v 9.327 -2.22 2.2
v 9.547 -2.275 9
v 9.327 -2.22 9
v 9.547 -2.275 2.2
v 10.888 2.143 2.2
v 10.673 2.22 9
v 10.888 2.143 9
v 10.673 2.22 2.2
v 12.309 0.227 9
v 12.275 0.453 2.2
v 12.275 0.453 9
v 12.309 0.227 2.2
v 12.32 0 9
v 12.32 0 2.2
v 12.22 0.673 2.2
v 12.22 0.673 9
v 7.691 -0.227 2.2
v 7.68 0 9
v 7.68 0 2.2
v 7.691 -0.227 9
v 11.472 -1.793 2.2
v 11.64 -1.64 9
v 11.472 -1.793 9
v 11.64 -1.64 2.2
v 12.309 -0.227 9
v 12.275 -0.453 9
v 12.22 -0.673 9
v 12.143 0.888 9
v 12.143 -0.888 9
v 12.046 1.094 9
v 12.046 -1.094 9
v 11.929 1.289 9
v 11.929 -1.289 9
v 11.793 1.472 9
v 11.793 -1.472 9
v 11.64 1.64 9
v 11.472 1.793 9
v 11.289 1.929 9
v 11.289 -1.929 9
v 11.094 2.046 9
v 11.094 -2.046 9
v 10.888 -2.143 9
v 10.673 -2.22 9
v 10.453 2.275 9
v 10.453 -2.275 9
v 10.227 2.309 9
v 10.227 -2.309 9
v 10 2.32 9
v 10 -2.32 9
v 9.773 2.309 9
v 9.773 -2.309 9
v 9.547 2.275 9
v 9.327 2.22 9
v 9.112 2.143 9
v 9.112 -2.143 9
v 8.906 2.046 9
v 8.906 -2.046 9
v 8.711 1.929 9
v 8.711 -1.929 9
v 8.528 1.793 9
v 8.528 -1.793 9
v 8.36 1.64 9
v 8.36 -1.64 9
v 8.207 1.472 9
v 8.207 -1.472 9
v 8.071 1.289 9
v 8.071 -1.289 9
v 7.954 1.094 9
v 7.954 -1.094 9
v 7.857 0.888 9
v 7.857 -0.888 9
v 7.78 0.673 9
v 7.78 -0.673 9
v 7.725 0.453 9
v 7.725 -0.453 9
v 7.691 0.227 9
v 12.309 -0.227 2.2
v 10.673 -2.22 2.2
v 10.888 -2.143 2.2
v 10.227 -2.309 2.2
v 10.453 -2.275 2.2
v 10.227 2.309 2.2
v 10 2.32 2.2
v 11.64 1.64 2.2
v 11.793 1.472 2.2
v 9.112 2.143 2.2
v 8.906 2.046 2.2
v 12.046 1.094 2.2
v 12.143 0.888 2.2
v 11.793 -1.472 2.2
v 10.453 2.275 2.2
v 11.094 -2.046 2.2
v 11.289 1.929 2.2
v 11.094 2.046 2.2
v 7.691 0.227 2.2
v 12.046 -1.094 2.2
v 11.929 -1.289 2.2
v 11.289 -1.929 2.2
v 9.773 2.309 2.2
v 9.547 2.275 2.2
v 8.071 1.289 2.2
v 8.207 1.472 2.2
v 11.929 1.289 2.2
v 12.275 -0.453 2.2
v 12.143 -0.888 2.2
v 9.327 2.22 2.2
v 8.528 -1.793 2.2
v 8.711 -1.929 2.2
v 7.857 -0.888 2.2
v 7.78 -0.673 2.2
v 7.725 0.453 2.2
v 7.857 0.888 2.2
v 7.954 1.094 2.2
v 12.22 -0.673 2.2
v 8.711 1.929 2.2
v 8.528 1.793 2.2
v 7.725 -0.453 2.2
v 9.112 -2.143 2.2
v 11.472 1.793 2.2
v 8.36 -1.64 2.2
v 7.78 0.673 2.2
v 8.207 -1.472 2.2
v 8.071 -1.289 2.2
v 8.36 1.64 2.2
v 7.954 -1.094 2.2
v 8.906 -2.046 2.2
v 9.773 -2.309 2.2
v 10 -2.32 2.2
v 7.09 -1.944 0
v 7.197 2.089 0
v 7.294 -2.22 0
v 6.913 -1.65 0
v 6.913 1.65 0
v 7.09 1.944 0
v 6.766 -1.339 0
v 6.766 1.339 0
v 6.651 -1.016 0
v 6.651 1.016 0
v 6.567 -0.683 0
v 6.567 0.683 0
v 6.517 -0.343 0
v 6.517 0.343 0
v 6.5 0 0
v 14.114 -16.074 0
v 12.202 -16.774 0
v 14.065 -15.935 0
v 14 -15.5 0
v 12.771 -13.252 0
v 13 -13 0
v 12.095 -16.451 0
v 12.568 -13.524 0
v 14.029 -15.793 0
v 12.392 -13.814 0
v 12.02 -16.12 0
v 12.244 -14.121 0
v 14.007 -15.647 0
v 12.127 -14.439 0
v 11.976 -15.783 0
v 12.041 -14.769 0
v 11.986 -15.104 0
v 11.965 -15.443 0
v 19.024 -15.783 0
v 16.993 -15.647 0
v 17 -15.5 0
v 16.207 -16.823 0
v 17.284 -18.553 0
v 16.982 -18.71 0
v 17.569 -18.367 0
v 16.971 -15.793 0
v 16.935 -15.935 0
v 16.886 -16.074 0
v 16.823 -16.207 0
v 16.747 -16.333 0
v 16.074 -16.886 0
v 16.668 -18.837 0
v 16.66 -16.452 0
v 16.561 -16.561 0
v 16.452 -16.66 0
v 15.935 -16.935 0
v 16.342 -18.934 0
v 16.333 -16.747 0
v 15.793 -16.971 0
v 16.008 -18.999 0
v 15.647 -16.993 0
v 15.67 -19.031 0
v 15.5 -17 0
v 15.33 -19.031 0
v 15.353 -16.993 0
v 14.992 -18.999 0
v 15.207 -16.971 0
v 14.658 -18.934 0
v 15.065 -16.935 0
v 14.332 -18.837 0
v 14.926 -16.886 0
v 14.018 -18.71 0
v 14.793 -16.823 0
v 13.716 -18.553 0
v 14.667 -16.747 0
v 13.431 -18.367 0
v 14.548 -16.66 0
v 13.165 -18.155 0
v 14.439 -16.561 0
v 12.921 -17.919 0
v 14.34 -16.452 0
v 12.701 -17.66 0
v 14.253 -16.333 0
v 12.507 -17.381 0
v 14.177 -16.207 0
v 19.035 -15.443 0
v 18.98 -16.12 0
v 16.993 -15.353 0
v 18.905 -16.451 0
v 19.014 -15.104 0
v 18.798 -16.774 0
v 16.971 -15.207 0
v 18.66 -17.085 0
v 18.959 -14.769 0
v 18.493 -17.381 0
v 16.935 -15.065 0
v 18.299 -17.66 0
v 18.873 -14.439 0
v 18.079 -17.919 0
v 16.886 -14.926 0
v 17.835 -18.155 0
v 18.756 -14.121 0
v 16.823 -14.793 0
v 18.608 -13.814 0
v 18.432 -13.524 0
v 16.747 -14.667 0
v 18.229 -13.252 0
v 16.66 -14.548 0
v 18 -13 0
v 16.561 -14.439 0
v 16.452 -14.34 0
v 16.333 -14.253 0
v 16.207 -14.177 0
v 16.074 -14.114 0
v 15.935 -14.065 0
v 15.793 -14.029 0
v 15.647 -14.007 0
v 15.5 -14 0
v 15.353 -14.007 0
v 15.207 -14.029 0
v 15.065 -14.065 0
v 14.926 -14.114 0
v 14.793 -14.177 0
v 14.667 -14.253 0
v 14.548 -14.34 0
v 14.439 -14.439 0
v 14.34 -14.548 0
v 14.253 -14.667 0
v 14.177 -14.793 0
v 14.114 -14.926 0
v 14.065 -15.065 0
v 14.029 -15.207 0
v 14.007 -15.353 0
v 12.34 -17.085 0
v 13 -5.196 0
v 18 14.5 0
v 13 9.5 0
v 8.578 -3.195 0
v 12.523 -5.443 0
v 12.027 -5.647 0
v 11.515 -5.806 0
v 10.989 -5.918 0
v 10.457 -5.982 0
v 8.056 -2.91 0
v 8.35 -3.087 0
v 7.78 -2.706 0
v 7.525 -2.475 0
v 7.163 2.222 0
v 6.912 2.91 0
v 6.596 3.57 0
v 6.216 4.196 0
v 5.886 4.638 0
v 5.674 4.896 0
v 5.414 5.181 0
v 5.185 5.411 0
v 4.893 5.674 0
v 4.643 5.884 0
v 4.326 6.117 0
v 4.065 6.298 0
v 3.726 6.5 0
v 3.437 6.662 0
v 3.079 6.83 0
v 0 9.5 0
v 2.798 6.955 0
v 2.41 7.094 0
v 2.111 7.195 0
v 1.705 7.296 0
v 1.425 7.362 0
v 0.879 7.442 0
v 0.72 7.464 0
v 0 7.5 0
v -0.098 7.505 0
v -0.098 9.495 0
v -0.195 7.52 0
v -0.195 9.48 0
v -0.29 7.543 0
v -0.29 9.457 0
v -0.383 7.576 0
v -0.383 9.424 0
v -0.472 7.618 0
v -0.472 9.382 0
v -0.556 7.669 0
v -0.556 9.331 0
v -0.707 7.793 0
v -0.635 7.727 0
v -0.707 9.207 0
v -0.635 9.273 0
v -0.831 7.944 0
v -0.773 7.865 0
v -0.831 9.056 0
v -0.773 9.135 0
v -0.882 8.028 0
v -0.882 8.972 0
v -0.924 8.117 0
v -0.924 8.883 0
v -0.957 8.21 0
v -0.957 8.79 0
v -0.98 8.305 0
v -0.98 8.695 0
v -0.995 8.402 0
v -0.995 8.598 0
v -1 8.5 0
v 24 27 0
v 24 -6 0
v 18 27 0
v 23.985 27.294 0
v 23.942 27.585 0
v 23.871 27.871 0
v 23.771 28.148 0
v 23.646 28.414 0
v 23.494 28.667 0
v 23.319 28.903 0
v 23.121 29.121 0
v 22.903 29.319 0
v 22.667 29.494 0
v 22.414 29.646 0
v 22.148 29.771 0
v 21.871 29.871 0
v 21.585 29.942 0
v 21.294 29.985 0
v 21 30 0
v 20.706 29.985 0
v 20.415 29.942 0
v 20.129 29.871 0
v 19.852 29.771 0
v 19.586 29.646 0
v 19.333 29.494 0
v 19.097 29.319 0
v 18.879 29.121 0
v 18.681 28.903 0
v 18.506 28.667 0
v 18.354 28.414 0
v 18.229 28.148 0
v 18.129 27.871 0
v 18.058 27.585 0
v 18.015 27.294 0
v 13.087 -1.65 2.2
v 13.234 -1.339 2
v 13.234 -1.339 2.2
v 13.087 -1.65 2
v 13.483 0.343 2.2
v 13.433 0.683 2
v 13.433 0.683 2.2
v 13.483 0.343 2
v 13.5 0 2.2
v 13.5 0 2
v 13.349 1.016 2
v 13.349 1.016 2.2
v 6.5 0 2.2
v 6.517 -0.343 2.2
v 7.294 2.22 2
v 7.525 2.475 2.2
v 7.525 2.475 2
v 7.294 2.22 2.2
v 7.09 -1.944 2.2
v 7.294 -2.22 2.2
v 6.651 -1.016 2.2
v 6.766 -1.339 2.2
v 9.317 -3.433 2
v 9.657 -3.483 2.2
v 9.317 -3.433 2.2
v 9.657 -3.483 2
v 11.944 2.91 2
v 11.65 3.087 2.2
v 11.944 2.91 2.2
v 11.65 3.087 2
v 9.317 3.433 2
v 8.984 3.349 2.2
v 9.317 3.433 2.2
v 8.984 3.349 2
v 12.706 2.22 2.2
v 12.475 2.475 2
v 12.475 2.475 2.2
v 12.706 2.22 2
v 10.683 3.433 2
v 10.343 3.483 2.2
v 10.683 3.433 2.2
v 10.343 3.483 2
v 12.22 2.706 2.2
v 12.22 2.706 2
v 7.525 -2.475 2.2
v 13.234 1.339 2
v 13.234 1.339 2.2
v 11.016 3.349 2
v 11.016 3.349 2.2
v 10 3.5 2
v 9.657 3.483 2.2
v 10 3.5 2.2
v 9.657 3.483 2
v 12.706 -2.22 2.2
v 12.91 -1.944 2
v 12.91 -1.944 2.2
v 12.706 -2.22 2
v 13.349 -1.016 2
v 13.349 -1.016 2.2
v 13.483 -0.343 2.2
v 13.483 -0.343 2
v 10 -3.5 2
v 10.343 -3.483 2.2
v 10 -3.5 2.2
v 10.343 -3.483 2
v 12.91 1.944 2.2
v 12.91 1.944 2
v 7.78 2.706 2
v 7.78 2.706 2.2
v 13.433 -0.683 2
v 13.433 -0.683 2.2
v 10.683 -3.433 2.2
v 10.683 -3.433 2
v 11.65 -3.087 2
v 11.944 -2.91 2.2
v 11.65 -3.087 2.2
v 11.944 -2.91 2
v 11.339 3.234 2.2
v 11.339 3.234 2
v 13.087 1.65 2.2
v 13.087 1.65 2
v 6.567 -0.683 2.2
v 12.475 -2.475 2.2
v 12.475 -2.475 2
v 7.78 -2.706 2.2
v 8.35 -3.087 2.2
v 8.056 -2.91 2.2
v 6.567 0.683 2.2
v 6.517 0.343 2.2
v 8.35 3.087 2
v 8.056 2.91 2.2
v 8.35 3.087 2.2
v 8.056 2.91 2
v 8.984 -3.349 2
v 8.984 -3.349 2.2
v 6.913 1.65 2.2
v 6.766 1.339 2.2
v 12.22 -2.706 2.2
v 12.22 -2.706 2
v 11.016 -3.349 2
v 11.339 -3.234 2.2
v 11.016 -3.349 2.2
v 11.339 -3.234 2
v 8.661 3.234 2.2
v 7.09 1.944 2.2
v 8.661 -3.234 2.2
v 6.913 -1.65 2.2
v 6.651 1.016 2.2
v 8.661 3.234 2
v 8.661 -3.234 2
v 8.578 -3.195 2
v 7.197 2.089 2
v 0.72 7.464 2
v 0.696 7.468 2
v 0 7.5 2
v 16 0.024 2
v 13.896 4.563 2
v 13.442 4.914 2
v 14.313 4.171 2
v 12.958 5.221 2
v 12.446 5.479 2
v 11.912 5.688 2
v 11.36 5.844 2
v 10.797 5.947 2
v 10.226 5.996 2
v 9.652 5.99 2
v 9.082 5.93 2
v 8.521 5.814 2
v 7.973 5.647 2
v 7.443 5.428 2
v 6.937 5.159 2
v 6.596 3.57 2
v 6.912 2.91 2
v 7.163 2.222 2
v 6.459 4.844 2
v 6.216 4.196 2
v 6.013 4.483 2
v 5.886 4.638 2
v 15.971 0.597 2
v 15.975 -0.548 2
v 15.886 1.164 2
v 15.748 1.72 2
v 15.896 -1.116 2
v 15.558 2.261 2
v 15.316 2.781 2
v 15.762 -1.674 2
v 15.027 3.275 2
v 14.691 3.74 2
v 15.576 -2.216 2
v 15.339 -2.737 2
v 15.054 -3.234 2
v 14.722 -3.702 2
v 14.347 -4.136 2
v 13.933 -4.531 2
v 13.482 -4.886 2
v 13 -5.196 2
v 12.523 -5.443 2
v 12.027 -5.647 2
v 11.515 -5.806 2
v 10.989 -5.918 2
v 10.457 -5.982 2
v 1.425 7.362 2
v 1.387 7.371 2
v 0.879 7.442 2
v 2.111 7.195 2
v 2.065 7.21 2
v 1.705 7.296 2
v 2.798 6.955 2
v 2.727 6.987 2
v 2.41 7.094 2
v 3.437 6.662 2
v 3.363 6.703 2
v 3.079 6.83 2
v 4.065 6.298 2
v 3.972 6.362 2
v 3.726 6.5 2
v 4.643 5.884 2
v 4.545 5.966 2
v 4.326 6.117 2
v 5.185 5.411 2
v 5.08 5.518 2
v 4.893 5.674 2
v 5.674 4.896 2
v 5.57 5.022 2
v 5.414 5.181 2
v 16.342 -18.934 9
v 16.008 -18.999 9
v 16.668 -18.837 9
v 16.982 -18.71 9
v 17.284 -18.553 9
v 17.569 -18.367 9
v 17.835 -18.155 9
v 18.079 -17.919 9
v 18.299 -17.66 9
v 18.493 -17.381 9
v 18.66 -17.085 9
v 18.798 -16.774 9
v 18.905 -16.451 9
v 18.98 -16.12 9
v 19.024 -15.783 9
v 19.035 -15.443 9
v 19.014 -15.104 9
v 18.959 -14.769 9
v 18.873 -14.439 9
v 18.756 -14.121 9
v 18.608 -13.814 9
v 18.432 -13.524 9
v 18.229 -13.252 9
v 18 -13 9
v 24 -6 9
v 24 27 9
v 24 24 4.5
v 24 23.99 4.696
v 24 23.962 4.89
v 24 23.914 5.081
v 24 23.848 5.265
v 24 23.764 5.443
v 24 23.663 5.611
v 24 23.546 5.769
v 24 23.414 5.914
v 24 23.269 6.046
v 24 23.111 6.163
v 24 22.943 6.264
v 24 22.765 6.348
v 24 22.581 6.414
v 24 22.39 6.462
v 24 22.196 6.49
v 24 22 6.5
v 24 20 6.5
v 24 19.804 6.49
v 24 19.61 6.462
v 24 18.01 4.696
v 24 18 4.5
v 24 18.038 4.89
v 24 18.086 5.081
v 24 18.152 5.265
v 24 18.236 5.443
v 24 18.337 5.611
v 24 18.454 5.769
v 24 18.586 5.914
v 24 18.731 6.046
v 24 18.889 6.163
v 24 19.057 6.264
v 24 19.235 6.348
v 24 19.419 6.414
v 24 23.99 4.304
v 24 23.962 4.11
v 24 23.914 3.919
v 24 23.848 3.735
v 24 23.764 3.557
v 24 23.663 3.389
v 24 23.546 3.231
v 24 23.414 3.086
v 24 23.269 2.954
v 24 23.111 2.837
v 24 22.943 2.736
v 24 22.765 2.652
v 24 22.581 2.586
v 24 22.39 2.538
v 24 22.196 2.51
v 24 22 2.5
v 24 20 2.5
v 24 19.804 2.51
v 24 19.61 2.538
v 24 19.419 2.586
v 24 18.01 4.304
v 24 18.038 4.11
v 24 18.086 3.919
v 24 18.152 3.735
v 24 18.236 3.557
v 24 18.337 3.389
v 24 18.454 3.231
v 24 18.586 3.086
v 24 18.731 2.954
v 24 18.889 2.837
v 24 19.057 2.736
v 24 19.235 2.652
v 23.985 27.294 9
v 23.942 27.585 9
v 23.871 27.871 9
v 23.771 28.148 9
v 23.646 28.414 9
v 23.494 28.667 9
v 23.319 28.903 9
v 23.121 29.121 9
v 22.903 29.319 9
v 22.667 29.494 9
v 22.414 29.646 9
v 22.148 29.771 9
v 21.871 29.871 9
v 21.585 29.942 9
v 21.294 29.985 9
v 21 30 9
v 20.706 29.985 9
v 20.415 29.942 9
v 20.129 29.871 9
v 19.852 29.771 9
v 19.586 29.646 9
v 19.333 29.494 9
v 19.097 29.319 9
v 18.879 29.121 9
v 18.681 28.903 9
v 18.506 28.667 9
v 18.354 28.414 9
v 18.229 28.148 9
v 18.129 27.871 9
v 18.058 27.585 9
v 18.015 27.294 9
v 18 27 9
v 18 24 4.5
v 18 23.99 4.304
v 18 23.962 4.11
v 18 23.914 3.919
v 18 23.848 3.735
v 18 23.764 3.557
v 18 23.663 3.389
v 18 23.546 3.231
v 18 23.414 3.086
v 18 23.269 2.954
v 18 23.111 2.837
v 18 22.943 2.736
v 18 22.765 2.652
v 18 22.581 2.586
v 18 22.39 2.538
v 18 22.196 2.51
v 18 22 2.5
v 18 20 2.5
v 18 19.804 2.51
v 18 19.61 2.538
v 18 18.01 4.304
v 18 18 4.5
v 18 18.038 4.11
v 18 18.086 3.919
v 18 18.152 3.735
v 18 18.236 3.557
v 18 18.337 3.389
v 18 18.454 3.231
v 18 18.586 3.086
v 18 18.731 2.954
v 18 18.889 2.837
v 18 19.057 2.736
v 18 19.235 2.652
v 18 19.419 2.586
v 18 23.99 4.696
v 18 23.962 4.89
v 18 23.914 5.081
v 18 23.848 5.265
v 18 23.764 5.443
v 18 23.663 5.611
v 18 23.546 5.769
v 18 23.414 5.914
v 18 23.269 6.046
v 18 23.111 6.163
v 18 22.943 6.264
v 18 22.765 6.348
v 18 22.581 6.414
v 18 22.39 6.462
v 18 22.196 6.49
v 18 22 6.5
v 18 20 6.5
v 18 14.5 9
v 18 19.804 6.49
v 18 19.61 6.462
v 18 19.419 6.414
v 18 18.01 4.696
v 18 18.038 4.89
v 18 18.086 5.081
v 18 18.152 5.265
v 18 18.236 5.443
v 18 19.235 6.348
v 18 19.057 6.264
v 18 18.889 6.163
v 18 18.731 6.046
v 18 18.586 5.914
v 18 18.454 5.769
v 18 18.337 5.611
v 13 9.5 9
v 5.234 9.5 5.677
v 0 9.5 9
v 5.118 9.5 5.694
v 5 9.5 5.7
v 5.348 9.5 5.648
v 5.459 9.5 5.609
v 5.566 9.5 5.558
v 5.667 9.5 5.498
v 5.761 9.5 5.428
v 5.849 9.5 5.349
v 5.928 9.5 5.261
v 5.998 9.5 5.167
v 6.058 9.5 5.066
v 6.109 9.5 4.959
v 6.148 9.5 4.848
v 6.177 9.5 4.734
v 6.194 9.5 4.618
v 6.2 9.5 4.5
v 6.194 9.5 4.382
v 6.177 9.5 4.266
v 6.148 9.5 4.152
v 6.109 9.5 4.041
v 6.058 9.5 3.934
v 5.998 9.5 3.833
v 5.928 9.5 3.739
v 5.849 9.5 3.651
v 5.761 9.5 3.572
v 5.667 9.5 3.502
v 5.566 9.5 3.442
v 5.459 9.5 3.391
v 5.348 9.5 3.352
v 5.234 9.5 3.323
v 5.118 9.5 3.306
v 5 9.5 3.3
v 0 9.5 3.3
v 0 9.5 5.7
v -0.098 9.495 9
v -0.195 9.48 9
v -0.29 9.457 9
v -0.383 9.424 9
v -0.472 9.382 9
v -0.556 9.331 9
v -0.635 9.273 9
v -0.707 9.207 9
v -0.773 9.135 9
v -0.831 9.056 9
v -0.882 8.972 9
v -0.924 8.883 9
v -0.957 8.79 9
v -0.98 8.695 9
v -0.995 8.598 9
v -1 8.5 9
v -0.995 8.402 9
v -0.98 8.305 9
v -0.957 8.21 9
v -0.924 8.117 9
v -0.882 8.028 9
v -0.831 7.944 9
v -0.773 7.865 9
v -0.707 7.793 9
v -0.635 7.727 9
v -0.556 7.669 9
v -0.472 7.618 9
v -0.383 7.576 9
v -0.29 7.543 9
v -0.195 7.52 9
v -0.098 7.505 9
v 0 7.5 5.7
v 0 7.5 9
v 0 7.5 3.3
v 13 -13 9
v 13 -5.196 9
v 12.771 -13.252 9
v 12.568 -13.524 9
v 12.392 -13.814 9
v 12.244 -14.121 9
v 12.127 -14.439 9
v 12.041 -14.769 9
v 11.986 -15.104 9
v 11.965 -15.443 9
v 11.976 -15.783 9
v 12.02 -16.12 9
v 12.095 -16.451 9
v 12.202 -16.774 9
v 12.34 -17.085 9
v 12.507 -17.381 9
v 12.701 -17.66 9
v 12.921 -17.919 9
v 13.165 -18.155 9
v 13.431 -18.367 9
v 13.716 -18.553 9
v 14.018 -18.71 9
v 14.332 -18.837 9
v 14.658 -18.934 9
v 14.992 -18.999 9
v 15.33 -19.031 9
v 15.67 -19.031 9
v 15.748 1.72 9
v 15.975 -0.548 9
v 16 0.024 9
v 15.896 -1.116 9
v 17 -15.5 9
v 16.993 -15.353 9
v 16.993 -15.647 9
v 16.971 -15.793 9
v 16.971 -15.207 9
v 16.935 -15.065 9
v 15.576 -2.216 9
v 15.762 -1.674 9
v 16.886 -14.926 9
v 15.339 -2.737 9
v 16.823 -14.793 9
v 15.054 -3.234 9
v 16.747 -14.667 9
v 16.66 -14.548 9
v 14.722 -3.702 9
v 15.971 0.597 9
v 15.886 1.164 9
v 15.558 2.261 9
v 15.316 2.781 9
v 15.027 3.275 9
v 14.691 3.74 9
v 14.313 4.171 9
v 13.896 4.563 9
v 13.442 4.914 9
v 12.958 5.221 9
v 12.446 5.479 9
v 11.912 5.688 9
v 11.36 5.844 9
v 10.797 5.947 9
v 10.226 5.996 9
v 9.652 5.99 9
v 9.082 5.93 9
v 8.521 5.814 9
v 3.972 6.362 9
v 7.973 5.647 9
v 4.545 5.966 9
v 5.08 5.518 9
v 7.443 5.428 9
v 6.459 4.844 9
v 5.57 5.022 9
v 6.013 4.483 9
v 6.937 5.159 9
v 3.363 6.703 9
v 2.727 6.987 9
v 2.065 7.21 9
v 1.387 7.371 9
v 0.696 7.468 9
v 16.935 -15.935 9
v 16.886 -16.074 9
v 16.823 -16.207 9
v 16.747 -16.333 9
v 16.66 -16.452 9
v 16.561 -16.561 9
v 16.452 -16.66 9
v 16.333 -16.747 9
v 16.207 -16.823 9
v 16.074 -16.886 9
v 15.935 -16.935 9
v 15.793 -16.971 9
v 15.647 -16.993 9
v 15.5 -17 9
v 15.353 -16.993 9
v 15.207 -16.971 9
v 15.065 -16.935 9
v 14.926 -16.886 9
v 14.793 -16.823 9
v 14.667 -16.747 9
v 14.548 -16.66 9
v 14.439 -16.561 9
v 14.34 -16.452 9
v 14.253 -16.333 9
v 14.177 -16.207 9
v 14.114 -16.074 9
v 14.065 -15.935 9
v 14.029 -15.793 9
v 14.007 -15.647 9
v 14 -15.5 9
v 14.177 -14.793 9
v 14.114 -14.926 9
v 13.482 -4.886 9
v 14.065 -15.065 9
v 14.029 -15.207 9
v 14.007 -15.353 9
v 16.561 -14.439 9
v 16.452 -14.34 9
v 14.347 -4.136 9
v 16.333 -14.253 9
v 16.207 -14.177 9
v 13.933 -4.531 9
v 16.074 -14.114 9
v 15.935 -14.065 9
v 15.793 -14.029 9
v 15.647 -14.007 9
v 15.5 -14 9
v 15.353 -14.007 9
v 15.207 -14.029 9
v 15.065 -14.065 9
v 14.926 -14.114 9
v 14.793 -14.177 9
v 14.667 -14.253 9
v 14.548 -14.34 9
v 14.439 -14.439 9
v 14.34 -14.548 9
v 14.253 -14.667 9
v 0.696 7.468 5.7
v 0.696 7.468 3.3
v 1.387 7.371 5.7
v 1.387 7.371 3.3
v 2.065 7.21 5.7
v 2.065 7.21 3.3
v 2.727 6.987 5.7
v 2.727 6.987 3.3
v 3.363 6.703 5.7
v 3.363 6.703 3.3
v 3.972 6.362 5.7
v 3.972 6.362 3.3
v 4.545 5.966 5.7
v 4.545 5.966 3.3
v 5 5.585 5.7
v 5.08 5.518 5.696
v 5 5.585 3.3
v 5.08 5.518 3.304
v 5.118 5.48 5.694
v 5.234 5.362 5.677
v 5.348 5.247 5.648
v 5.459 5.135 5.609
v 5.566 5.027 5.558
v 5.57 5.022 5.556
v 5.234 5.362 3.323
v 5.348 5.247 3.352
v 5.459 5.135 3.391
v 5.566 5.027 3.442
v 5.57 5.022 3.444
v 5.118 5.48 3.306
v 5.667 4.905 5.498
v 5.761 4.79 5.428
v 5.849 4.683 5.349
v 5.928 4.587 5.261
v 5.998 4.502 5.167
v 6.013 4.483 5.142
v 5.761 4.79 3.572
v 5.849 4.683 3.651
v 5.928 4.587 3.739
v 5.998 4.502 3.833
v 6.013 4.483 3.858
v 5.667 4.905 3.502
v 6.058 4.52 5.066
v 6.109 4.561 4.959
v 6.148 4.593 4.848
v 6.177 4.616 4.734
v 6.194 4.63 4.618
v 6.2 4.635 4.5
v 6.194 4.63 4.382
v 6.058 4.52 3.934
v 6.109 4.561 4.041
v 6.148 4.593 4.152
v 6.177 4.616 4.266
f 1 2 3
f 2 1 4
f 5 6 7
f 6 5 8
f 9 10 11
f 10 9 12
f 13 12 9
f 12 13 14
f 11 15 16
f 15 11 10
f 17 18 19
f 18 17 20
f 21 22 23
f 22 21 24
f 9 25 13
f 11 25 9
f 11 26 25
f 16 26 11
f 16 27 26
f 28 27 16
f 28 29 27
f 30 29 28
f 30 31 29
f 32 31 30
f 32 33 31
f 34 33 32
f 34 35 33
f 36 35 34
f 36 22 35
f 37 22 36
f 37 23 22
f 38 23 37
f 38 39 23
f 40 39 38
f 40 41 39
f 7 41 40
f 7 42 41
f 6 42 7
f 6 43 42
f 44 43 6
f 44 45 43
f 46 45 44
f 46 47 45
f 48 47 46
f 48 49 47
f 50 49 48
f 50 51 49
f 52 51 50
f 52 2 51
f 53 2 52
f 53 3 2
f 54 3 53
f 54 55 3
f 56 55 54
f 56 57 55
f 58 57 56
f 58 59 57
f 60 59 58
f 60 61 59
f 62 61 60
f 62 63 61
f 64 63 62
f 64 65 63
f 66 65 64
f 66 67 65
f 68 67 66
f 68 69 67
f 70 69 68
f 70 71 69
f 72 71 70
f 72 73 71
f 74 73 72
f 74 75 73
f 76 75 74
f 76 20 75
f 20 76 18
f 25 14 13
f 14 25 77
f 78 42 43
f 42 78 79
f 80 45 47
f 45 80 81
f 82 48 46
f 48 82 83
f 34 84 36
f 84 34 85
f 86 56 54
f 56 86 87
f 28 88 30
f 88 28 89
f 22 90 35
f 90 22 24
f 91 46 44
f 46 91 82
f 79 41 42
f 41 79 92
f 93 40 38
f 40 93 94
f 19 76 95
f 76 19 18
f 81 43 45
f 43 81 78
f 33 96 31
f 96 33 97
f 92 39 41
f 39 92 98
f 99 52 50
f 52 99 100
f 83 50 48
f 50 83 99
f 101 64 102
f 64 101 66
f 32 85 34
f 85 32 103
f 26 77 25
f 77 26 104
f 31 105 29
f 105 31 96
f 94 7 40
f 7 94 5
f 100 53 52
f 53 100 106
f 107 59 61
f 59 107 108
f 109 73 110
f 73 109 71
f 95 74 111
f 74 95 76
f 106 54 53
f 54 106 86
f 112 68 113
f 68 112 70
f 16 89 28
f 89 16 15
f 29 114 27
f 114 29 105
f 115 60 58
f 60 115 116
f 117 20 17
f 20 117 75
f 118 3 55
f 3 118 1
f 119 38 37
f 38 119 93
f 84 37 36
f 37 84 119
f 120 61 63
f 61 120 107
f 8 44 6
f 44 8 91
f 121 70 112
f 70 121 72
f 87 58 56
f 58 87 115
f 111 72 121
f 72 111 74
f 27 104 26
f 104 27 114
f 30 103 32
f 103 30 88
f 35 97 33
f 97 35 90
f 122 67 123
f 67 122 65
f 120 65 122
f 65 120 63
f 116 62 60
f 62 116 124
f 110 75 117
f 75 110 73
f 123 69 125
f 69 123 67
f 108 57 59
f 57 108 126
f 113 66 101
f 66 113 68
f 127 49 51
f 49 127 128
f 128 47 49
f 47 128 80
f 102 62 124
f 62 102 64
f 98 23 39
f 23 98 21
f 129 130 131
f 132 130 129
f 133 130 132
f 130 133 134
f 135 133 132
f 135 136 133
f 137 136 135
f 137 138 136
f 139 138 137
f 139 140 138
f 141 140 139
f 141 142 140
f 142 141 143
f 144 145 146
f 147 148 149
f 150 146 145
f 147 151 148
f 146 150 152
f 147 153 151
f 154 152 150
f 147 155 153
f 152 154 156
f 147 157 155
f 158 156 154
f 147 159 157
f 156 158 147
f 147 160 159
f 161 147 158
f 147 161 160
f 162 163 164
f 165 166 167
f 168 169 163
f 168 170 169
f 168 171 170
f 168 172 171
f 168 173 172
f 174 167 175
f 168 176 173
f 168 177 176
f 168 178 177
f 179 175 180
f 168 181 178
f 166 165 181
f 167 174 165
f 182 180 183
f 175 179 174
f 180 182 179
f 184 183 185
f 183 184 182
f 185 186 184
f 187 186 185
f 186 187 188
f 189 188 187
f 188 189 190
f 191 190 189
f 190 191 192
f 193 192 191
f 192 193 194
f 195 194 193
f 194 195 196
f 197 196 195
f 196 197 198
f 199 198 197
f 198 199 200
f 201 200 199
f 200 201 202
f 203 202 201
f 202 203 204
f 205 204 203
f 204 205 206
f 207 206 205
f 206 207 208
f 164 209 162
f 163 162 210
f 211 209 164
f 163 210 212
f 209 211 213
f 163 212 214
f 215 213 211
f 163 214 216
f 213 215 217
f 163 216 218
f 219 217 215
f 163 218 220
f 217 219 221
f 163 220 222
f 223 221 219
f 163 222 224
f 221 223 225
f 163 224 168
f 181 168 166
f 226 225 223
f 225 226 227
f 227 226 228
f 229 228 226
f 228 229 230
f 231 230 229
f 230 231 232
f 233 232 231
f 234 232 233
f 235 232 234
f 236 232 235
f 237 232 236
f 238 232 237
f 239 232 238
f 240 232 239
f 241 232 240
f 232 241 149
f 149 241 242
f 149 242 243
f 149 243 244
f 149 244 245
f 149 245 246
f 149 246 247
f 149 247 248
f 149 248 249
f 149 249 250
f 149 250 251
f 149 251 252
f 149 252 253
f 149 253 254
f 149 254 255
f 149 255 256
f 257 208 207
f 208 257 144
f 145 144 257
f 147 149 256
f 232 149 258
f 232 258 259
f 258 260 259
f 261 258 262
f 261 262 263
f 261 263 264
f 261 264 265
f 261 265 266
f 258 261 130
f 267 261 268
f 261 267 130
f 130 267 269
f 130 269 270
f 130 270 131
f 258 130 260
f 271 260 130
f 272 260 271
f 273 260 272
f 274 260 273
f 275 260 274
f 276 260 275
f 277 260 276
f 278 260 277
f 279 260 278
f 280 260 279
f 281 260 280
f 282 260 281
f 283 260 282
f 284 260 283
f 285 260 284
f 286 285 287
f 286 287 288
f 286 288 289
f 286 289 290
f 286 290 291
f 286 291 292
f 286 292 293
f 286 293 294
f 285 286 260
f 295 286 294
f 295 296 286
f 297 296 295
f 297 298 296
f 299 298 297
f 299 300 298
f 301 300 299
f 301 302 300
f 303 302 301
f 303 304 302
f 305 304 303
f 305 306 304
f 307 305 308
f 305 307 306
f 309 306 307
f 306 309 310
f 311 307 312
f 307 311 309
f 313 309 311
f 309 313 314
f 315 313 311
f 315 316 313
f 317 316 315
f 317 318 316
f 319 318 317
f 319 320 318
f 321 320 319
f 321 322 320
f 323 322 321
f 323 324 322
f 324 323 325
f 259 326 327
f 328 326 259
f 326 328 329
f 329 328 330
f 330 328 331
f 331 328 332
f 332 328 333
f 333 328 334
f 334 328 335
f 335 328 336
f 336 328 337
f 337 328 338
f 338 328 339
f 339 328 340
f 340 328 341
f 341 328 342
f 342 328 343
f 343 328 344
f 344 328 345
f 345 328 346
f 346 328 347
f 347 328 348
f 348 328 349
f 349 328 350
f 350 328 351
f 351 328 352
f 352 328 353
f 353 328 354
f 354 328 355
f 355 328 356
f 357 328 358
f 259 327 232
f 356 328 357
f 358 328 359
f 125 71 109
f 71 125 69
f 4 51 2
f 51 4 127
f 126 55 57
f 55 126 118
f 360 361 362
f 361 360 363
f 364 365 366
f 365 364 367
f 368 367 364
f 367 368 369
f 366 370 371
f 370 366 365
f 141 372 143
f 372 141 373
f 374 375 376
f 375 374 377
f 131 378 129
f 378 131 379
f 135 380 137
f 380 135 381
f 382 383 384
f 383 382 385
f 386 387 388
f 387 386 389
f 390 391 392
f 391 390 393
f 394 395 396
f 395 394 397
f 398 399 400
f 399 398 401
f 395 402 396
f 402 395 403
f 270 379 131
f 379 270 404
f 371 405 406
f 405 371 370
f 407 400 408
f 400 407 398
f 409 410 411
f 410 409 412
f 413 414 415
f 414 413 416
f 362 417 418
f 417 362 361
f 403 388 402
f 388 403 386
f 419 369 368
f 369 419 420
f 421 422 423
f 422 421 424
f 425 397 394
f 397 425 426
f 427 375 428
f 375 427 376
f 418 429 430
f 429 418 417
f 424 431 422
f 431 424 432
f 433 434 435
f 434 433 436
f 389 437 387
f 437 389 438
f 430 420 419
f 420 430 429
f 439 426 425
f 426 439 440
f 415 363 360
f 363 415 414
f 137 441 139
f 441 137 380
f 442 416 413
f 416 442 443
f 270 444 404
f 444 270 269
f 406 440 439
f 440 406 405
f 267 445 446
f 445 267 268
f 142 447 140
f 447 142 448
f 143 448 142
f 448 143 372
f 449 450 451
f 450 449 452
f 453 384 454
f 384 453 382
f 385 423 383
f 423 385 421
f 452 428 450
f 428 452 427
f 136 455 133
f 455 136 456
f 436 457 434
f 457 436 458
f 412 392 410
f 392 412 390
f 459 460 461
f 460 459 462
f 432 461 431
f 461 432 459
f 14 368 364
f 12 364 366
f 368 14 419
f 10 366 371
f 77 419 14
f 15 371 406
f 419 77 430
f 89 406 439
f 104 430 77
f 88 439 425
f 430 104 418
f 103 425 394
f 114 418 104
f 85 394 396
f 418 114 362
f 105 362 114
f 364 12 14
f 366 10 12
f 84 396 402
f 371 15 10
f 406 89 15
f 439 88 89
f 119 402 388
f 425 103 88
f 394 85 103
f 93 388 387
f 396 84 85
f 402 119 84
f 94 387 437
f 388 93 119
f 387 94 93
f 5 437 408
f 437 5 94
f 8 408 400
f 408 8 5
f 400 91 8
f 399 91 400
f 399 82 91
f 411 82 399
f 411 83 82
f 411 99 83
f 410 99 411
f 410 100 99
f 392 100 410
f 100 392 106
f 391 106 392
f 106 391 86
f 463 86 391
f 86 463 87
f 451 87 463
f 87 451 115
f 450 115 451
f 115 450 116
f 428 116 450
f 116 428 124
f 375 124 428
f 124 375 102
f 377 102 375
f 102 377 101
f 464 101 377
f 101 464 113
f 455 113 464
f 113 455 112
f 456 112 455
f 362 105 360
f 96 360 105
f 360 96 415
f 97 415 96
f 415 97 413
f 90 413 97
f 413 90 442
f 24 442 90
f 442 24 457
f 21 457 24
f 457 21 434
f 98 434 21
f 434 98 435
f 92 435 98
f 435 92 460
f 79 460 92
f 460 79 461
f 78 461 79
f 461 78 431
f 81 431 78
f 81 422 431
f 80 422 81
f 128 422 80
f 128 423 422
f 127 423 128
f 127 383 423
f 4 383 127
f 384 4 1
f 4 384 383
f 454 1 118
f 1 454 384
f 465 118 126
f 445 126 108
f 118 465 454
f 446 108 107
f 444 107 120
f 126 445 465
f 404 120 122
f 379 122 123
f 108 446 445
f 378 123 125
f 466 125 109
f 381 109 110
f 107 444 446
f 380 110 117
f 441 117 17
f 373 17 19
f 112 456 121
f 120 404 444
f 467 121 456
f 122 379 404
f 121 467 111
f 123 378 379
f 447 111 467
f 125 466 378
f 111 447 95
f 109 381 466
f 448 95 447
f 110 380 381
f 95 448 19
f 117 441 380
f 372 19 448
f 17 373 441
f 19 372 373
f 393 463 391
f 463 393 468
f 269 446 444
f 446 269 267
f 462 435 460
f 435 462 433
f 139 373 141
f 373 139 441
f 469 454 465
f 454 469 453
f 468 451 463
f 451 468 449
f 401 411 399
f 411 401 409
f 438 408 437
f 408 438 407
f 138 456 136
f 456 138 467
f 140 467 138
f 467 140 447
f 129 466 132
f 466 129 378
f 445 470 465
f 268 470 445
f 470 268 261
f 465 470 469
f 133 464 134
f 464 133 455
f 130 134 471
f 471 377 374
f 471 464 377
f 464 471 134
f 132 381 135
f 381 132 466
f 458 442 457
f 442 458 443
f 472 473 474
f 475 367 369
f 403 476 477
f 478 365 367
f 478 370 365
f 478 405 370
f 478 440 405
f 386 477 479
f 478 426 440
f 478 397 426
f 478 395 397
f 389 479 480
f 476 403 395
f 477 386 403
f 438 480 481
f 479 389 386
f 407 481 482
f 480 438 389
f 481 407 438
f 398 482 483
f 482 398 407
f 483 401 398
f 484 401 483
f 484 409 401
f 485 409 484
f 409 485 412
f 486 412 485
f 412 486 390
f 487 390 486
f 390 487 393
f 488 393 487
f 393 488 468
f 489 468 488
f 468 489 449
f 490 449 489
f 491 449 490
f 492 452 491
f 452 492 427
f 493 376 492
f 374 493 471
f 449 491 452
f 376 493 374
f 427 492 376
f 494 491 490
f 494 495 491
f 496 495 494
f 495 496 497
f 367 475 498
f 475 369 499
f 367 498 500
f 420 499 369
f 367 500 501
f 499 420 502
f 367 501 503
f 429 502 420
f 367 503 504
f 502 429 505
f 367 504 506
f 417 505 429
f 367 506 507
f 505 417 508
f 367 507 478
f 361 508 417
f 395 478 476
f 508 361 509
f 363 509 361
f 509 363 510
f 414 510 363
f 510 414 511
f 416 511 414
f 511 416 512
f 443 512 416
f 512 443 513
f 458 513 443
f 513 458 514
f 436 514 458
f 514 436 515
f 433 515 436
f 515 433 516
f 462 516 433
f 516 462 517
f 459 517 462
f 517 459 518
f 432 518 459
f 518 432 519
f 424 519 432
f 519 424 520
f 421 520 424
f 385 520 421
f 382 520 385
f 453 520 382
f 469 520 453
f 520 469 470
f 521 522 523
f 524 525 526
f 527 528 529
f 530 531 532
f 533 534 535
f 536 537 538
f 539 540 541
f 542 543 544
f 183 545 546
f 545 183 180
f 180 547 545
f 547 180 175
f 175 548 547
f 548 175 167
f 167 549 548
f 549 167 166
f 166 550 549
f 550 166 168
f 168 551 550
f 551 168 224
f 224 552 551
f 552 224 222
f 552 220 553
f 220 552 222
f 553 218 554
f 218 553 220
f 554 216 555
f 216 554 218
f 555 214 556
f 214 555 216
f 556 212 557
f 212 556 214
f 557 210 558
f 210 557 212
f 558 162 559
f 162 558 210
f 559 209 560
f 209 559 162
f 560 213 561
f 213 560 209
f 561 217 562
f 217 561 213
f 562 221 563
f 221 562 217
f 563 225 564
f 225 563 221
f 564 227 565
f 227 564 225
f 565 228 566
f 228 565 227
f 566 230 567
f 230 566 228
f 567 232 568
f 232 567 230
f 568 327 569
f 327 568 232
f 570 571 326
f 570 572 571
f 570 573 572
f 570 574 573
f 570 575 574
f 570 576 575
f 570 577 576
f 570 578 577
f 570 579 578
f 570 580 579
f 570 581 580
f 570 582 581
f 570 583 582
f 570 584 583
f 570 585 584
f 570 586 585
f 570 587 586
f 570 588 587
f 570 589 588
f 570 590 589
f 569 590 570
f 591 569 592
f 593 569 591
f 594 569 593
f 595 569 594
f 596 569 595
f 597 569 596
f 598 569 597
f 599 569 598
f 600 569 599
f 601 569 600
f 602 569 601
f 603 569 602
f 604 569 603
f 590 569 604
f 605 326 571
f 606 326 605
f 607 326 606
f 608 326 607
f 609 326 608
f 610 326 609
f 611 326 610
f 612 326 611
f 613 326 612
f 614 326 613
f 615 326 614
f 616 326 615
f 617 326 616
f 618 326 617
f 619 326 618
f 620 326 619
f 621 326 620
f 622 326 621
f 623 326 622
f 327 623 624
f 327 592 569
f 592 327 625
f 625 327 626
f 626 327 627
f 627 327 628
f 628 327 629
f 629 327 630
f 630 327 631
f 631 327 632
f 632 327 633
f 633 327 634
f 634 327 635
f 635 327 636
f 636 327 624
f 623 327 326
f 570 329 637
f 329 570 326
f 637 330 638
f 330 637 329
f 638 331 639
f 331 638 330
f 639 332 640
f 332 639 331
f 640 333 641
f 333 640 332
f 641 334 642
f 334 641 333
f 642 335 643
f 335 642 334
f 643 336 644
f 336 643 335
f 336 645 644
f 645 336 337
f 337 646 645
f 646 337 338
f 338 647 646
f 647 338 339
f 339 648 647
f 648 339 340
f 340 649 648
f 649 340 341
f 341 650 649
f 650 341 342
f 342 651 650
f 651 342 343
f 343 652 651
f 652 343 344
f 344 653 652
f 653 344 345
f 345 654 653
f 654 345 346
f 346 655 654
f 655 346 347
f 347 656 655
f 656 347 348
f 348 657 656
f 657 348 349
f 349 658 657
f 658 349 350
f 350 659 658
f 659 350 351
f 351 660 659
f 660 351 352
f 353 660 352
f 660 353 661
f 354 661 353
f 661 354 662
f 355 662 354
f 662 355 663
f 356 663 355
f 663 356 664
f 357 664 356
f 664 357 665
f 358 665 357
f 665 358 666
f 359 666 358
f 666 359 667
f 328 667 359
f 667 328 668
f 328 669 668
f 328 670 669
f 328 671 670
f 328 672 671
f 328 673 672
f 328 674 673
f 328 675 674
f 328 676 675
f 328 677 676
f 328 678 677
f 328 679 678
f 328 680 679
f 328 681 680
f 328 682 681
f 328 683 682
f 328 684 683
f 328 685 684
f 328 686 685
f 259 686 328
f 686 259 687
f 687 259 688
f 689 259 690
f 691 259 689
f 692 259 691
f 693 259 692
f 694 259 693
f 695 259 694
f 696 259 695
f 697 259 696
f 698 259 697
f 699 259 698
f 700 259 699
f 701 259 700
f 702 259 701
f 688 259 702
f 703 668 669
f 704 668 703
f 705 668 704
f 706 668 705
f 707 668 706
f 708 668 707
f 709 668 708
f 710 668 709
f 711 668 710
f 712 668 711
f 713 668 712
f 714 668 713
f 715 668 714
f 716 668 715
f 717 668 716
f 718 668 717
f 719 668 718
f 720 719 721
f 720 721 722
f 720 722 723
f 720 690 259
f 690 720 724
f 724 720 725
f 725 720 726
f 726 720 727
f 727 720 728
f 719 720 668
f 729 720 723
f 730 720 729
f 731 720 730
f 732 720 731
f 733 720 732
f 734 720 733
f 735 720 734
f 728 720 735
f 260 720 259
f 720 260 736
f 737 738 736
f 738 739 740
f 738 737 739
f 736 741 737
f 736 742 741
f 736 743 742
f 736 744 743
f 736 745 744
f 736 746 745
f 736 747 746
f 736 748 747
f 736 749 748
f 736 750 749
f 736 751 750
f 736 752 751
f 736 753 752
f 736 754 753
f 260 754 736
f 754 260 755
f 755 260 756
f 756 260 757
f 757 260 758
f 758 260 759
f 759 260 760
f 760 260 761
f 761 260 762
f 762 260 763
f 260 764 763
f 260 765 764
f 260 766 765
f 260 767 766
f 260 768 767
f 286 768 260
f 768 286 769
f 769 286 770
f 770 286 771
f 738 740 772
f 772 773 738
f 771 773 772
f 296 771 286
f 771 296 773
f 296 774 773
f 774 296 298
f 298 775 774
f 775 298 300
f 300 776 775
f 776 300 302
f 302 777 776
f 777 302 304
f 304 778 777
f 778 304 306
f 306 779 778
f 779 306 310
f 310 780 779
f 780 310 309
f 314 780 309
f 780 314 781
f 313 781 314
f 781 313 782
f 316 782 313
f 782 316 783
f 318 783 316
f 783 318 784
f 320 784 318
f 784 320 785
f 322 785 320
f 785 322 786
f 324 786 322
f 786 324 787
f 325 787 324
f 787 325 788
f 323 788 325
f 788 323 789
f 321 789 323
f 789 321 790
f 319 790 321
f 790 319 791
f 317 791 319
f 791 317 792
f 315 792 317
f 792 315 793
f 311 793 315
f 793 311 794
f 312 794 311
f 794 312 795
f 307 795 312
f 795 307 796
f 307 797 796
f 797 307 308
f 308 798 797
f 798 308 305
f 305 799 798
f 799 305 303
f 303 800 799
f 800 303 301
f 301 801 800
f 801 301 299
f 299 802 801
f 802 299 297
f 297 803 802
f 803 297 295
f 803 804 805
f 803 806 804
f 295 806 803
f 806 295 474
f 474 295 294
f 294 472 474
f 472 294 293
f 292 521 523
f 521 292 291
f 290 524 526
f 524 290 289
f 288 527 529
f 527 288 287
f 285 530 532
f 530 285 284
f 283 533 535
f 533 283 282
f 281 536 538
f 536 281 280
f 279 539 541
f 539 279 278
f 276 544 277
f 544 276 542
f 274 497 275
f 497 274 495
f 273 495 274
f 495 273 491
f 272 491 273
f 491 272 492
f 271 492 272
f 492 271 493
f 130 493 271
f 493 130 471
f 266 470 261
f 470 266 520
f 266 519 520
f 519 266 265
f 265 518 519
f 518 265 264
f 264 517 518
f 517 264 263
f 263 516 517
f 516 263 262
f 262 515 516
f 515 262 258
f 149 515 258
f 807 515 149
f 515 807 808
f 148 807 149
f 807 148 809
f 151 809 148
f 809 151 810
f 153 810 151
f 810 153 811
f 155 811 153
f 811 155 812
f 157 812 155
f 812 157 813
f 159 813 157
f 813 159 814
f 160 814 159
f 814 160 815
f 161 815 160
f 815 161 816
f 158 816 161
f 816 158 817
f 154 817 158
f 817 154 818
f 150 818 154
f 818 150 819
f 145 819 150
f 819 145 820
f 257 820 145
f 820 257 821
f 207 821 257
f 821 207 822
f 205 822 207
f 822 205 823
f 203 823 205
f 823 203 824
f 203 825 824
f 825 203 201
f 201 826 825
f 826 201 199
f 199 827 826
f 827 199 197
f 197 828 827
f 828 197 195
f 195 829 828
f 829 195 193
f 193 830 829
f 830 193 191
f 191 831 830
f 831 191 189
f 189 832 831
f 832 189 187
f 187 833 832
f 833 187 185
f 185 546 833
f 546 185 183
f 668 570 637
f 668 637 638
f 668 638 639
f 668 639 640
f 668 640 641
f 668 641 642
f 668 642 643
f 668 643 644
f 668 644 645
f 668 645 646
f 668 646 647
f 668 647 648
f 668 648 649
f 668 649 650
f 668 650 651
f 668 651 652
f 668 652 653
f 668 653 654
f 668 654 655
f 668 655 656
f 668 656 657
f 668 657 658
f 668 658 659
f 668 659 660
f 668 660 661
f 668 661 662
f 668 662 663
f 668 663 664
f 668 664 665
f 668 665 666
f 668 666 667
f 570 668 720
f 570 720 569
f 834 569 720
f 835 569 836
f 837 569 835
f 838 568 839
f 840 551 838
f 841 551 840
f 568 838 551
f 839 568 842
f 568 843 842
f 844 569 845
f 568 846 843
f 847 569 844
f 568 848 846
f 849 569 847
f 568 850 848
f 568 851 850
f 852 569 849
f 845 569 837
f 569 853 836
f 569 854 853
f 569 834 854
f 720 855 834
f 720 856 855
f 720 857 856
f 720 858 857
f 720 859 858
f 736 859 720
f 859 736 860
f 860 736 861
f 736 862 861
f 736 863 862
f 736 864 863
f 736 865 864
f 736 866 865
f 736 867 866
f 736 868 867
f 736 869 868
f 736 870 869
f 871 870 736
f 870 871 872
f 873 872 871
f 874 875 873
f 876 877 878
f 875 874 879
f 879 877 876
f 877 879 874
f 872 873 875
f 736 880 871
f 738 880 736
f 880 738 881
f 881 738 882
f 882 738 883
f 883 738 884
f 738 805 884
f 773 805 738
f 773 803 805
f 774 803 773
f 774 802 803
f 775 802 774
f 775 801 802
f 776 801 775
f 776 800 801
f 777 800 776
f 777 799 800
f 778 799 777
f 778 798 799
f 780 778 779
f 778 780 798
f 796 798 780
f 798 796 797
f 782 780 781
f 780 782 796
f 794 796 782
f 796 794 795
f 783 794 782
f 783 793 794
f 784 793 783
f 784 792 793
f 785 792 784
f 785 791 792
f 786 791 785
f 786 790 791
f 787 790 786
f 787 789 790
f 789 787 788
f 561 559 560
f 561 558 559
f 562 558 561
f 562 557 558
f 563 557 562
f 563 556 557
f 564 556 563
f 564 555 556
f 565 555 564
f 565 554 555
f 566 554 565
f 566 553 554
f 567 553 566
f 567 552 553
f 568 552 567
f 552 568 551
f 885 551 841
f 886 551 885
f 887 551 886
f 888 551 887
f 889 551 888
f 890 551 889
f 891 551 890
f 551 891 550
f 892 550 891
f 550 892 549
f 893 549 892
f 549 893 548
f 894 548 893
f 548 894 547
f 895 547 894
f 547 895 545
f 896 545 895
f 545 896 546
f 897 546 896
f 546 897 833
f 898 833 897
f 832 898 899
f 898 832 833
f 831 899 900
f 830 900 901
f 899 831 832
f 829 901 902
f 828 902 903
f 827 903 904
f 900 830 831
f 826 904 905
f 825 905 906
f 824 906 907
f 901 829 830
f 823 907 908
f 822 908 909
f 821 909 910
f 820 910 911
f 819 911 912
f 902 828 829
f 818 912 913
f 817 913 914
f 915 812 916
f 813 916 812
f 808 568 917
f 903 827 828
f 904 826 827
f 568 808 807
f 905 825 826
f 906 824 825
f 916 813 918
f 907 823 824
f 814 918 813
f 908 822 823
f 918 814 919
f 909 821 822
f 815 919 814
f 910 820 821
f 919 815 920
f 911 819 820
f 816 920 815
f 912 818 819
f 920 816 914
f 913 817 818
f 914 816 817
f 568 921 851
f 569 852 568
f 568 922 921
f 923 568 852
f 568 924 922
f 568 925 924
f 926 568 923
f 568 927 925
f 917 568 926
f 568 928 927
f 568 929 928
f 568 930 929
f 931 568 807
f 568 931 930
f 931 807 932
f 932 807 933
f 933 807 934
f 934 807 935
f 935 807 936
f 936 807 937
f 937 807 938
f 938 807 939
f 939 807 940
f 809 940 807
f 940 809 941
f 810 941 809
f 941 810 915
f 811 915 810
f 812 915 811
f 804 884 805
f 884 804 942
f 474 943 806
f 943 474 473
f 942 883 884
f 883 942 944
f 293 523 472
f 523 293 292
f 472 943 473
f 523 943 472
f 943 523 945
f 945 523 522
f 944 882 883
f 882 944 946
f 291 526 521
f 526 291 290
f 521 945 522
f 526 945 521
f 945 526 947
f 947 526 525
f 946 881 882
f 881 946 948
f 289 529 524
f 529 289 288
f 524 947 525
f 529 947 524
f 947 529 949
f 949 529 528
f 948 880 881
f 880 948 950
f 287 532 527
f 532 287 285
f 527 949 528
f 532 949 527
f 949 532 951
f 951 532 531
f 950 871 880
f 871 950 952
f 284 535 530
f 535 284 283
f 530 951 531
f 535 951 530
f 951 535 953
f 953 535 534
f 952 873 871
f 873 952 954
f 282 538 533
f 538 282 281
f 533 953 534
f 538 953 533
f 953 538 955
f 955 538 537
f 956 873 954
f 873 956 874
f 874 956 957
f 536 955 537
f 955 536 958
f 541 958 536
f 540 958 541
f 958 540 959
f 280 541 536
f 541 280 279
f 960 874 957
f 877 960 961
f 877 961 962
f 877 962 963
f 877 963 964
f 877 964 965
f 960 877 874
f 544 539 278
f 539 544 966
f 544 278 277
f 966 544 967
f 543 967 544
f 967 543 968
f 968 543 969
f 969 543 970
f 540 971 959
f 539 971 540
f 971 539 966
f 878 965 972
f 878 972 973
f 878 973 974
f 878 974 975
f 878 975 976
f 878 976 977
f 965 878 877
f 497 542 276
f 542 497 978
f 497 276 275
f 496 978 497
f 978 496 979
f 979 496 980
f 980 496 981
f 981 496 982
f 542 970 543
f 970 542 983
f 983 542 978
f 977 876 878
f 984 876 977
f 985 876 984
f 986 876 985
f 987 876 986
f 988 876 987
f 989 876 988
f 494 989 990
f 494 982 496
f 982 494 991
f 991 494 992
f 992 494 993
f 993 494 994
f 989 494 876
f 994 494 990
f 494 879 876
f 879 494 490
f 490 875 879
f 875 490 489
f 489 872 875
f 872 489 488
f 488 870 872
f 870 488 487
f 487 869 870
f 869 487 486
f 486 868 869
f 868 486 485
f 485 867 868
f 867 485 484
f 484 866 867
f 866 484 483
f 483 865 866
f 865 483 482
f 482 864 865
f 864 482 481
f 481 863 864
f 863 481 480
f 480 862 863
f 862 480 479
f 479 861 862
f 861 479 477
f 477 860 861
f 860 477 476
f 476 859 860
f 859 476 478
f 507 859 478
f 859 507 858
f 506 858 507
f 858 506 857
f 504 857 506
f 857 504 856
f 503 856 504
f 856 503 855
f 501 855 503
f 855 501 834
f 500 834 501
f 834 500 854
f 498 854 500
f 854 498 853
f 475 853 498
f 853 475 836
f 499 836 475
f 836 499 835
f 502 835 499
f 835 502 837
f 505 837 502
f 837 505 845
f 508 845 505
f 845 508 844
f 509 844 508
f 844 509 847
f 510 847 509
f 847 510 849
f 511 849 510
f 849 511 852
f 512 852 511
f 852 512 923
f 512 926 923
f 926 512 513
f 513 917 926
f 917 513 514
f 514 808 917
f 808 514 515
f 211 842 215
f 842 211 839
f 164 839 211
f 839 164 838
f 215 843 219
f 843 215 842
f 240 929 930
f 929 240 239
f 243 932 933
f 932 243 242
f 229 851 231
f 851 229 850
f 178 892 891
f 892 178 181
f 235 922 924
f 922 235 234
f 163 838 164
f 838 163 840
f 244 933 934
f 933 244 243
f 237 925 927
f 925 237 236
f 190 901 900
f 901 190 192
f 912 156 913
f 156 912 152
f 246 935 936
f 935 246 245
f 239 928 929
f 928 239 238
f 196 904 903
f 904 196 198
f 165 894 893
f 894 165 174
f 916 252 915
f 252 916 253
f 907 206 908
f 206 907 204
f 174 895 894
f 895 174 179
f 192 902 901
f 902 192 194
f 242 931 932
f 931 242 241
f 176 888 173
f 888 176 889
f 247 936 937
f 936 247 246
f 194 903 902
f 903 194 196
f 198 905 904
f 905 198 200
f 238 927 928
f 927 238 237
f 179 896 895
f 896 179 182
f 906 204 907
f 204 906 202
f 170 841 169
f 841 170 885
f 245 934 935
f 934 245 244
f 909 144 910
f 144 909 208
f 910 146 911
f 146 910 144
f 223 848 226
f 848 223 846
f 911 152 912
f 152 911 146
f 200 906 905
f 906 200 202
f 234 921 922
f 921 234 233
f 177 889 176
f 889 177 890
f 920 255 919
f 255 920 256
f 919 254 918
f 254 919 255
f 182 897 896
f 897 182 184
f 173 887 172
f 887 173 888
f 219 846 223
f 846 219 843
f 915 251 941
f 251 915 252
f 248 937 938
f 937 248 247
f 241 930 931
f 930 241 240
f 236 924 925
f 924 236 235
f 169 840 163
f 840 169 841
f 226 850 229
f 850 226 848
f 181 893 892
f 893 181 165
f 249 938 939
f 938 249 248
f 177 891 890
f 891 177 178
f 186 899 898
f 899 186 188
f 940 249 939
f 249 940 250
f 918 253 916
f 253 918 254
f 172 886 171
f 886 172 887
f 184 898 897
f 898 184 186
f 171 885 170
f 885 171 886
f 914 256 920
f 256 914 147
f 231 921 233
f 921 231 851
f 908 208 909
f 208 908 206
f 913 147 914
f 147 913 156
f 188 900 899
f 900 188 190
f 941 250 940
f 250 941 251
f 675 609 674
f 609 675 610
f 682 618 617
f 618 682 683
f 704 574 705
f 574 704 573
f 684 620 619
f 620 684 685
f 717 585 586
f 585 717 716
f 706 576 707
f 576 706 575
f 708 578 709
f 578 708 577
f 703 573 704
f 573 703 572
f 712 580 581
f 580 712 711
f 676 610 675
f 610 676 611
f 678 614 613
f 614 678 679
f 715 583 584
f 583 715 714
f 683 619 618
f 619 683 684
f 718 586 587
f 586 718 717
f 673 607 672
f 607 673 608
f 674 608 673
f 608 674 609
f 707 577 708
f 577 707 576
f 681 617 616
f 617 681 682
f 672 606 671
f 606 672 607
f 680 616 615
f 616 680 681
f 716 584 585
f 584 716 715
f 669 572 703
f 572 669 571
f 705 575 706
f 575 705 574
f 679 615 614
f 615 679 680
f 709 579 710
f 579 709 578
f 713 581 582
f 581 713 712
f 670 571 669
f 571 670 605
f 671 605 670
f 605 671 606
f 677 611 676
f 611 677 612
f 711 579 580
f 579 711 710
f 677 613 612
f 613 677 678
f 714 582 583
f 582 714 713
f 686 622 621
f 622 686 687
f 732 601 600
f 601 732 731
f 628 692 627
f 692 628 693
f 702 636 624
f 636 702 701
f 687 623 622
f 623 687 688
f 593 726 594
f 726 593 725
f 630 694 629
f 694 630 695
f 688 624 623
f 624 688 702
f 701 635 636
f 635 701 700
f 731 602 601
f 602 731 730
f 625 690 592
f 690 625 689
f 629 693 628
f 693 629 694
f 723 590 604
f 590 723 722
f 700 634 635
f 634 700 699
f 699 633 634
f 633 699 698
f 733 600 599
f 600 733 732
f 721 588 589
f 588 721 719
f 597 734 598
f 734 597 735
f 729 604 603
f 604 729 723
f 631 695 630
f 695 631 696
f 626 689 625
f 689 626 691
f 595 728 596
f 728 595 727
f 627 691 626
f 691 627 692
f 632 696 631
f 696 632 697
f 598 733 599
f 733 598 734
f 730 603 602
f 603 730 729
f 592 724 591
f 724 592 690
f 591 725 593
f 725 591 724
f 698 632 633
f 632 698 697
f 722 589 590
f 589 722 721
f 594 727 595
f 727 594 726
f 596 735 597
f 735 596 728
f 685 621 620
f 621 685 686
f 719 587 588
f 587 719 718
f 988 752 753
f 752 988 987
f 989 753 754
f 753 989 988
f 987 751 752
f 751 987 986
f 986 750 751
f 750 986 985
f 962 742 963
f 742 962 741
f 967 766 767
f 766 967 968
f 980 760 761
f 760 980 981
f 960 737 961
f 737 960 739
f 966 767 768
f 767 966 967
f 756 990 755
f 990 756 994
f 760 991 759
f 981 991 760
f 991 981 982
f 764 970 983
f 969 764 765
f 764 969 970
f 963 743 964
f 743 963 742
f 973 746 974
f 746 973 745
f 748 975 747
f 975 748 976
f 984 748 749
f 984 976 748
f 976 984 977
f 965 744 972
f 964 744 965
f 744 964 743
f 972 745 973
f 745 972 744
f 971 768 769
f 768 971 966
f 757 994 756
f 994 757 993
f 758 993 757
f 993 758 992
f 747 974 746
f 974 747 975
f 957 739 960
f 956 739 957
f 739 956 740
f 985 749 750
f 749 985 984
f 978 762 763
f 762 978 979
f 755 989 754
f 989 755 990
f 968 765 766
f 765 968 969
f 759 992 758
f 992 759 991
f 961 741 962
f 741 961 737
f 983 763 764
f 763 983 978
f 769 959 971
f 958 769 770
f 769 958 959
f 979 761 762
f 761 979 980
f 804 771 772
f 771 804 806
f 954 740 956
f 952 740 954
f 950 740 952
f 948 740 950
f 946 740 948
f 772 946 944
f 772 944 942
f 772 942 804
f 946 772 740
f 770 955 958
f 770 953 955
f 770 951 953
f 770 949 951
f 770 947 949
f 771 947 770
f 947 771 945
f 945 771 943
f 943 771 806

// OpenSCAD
x_filament = 4.4;
z_filament = 9.5;

x_idler = 10;

module mk8() {
	translate([0,0,z_filament])
	rotate_extrude(convexity = 10, $fn = 100) 
	import (file = "MyExtruder_v1.2.dxf", layer = "mk8");
}

module base() {

difference() {

	union() {
		
		// Import the 2D design
		linear_extrude(height = 3, center = false, convexity = 10)
  			import (file = "MyExtruder_v1.2.dxf", layer = "base", $fn=64);
		linear_extrude(height = 14, center = false, convexity = 10)
   			import (file = "MyExtruder_v1.2.dxf", layer = "base_top", $fn=64);
		
		// Support for the idler hinge
		translate([15.5,-15.5,0]) {
			cylinder(r=5, h=5, $fn=64);
		}
	}

	union() {
		
		// Import the 2D design
		translate([0,0,-1]) linear_extrude(height = 16, center = false, convexity = 10)
  			import (file = "MyExtruder_v1.2.dxf", layer = "base_hole", $fn=64);

		translate([0,0,z_filament])
		rotate_extrude(convexity = 10, $fn = 100) 
		import (file = "MyExtruder_v1.2.dxf", layer = "mk8ext");
		
		// Hole for the motor screws
		translate([15.5,-15.5,-1]) cylinder(r=1.5, h=16, $fn=64);
		translate([-15.5,-15.5,-1]) cylinder(r=1.5, h=16, $fn=64);
		translate([15.5,15.5,-1]) cylinder(r=1.5, h=16, $fn=64);
		translate([-15.5,15.5,-1]) cylinder(r=1.5, h=16, $fn=64);

		// motor hole 
		translate([0,0,-1]) cylinder(r=11.1, h=3, $fn=64);

		// Hole for the filament
		translate([x_filament,35,z_filament]) rotate([90,0,0]) cylinder(r=1.2, h=70, $fn=64);

		// Hole for the spring nut
		translate([6,21,9.5]) rotate([0,90,0]) cylinder(r=2, h=12, $fn=64);			
		translate([7.8,17.4,15.5]) rotate([0,90,0]) cube([10,7.2,3.2]);	

		// Hole for the hot-end
		translate([x_filament,-21,z_filament]) rotate([90,0,0]) cylinder(r=8.05, h=4.1, $fn=64);
		translate([x_filament,-25,z_filament]) rotate([90,0,0]) cylinder(r=6.05, h=6, $fn=64);
		translate([x_filament-8.05,-21,z_filament]) rotate([90,0,0]) cube([16.1, 10, 4.1]);
		translate([x_filament-6.05,-25,z_filament]) rotate([90,0,0]) cube([12.1, 10, 6]);

		// Holes for the hod-end mount screws
		translate([15.5,-26,-1]) { 
				cylinder(r=1.5, h=16, $fn=64);
				cylinder(r=3.3, h=6, $fn=6);
		}
		translate([-15.5+8,-26,-1]) {
			cylinder(r=1.5, h=16, $fn=64);
			cylinder(r=3.3, h=6, $fn=6);
		}

		// Hole for the fan mount
		translate([-17.5,-28+3.6,10]) rotate([0,90,0]) cylinder(r=2, h=8, $fn=64);	
		translate([-13.5,-28,16]) rotate([0,90,0]) cube([10,7.2,3.2]);	

	}

}
	// Import the 2D design, Add some support
		translate([0,0,0]) linear_extrude(height = 2, center = false, convexity = 10)
  			import (file = "MyExtruder_v1.2.dxf", layer = "support", $fn=64);

}

module hot_end_mount() {
difference() {

	union() {
		// Import the 2D design
		translate([0,0,14]) linear_extrude(height = 5, center = false, convexity = 10)
  			import (file = "MyExtruder_v1.2.dxf", layer = "hot_mount", $fn=64);

	}

	union() {
		
		// Hole for the hot-end
		translate([4,-20.9,z_filament-0.1]) rotate([90,0,0]) cylinder(r=8.05, h=4.2, $fn=64);
		translate([4,-25,z_filament-0.1]) rotate([90,0,0]) cylinder(r=6.05, h=6.1, $fn=64);

		translate([-25,-50, 0]) cube([50,50,12]);

		// Holes for the hod-end mount screws
		translate([15.5,-26,10]) { 
				cylinder(r=1.5, h=16, $fn=64);
				//cylinder(r=3.3, h=4, $fn=6);
		}
		translate([-15.5+8,-26,10]) {
			cylinder(r=1.5, h=16, $fn=64);
			//cylinder(r=3.3, h=4, $fn=6);
		}

	}

}

}


module idler() {

difference() {

	union() {
		
		// Import the 2D design
		linear_extrude(height = 2, center = false, convexity = 10)
  			import (file = "MyExtruder_v1.2.dxf", layer = "idler_base", $fn=64);
		linear_extrude(height = 9, center = false, convexity = 10)
   			import (file = "MyExtruder_v1.2.dxf", layer = "idler", $fn=64);
		
		// Support for the bearing
		translate([x_idler,0,0]) {
			cylinder(r=2.32, h=9, $fn=64);
			cylinder(r=3.5, h=2.2, $fn=64);
		}
	}

	union() {
		
		// Hole for the bearing screw (to be taped M3)
		//translate([x_idler,0,-1]) cylinder(r=1.47, h=12, $fn=64);

		// Hole for the hinge screw
		translate([15.5,-15.5,-1]) cylinder(r=1.5, h=12, $fn=64);

		// Hole for the filament
		translate([15,22,z_filament-5]) rotate([0,90,0]) cylinder(r=2, h=12, $fn=64);	
		translate([15,20,z_filament-5]) rotate([0,90,0]) cylinder(r=2, h=12, $fn=64);	
		translate([15,20,z_filament-3]) rotate([0,90,0]) cube([4,2,12]);	

		// Hole for the spring 
		translate([5,12,4.5]) rotate([90,0,0]) cylinder(r=1.2, h=12, $fn=64);	
		translate([0,12,3.3]) rotate([90,0,0]) cube([5,2.4,12]);	
	}

}

}
//mk8();
//base();
//translate([0,0,1]) 
//rotate([0, 180, 0]) hot_end_mount();
//translate([0,0,5]) 
idler();
%translate([x_filament,35,z_filament]) rotate([90,0,0]) cylinder(r=1.75/2, h=70, $fn=64);
